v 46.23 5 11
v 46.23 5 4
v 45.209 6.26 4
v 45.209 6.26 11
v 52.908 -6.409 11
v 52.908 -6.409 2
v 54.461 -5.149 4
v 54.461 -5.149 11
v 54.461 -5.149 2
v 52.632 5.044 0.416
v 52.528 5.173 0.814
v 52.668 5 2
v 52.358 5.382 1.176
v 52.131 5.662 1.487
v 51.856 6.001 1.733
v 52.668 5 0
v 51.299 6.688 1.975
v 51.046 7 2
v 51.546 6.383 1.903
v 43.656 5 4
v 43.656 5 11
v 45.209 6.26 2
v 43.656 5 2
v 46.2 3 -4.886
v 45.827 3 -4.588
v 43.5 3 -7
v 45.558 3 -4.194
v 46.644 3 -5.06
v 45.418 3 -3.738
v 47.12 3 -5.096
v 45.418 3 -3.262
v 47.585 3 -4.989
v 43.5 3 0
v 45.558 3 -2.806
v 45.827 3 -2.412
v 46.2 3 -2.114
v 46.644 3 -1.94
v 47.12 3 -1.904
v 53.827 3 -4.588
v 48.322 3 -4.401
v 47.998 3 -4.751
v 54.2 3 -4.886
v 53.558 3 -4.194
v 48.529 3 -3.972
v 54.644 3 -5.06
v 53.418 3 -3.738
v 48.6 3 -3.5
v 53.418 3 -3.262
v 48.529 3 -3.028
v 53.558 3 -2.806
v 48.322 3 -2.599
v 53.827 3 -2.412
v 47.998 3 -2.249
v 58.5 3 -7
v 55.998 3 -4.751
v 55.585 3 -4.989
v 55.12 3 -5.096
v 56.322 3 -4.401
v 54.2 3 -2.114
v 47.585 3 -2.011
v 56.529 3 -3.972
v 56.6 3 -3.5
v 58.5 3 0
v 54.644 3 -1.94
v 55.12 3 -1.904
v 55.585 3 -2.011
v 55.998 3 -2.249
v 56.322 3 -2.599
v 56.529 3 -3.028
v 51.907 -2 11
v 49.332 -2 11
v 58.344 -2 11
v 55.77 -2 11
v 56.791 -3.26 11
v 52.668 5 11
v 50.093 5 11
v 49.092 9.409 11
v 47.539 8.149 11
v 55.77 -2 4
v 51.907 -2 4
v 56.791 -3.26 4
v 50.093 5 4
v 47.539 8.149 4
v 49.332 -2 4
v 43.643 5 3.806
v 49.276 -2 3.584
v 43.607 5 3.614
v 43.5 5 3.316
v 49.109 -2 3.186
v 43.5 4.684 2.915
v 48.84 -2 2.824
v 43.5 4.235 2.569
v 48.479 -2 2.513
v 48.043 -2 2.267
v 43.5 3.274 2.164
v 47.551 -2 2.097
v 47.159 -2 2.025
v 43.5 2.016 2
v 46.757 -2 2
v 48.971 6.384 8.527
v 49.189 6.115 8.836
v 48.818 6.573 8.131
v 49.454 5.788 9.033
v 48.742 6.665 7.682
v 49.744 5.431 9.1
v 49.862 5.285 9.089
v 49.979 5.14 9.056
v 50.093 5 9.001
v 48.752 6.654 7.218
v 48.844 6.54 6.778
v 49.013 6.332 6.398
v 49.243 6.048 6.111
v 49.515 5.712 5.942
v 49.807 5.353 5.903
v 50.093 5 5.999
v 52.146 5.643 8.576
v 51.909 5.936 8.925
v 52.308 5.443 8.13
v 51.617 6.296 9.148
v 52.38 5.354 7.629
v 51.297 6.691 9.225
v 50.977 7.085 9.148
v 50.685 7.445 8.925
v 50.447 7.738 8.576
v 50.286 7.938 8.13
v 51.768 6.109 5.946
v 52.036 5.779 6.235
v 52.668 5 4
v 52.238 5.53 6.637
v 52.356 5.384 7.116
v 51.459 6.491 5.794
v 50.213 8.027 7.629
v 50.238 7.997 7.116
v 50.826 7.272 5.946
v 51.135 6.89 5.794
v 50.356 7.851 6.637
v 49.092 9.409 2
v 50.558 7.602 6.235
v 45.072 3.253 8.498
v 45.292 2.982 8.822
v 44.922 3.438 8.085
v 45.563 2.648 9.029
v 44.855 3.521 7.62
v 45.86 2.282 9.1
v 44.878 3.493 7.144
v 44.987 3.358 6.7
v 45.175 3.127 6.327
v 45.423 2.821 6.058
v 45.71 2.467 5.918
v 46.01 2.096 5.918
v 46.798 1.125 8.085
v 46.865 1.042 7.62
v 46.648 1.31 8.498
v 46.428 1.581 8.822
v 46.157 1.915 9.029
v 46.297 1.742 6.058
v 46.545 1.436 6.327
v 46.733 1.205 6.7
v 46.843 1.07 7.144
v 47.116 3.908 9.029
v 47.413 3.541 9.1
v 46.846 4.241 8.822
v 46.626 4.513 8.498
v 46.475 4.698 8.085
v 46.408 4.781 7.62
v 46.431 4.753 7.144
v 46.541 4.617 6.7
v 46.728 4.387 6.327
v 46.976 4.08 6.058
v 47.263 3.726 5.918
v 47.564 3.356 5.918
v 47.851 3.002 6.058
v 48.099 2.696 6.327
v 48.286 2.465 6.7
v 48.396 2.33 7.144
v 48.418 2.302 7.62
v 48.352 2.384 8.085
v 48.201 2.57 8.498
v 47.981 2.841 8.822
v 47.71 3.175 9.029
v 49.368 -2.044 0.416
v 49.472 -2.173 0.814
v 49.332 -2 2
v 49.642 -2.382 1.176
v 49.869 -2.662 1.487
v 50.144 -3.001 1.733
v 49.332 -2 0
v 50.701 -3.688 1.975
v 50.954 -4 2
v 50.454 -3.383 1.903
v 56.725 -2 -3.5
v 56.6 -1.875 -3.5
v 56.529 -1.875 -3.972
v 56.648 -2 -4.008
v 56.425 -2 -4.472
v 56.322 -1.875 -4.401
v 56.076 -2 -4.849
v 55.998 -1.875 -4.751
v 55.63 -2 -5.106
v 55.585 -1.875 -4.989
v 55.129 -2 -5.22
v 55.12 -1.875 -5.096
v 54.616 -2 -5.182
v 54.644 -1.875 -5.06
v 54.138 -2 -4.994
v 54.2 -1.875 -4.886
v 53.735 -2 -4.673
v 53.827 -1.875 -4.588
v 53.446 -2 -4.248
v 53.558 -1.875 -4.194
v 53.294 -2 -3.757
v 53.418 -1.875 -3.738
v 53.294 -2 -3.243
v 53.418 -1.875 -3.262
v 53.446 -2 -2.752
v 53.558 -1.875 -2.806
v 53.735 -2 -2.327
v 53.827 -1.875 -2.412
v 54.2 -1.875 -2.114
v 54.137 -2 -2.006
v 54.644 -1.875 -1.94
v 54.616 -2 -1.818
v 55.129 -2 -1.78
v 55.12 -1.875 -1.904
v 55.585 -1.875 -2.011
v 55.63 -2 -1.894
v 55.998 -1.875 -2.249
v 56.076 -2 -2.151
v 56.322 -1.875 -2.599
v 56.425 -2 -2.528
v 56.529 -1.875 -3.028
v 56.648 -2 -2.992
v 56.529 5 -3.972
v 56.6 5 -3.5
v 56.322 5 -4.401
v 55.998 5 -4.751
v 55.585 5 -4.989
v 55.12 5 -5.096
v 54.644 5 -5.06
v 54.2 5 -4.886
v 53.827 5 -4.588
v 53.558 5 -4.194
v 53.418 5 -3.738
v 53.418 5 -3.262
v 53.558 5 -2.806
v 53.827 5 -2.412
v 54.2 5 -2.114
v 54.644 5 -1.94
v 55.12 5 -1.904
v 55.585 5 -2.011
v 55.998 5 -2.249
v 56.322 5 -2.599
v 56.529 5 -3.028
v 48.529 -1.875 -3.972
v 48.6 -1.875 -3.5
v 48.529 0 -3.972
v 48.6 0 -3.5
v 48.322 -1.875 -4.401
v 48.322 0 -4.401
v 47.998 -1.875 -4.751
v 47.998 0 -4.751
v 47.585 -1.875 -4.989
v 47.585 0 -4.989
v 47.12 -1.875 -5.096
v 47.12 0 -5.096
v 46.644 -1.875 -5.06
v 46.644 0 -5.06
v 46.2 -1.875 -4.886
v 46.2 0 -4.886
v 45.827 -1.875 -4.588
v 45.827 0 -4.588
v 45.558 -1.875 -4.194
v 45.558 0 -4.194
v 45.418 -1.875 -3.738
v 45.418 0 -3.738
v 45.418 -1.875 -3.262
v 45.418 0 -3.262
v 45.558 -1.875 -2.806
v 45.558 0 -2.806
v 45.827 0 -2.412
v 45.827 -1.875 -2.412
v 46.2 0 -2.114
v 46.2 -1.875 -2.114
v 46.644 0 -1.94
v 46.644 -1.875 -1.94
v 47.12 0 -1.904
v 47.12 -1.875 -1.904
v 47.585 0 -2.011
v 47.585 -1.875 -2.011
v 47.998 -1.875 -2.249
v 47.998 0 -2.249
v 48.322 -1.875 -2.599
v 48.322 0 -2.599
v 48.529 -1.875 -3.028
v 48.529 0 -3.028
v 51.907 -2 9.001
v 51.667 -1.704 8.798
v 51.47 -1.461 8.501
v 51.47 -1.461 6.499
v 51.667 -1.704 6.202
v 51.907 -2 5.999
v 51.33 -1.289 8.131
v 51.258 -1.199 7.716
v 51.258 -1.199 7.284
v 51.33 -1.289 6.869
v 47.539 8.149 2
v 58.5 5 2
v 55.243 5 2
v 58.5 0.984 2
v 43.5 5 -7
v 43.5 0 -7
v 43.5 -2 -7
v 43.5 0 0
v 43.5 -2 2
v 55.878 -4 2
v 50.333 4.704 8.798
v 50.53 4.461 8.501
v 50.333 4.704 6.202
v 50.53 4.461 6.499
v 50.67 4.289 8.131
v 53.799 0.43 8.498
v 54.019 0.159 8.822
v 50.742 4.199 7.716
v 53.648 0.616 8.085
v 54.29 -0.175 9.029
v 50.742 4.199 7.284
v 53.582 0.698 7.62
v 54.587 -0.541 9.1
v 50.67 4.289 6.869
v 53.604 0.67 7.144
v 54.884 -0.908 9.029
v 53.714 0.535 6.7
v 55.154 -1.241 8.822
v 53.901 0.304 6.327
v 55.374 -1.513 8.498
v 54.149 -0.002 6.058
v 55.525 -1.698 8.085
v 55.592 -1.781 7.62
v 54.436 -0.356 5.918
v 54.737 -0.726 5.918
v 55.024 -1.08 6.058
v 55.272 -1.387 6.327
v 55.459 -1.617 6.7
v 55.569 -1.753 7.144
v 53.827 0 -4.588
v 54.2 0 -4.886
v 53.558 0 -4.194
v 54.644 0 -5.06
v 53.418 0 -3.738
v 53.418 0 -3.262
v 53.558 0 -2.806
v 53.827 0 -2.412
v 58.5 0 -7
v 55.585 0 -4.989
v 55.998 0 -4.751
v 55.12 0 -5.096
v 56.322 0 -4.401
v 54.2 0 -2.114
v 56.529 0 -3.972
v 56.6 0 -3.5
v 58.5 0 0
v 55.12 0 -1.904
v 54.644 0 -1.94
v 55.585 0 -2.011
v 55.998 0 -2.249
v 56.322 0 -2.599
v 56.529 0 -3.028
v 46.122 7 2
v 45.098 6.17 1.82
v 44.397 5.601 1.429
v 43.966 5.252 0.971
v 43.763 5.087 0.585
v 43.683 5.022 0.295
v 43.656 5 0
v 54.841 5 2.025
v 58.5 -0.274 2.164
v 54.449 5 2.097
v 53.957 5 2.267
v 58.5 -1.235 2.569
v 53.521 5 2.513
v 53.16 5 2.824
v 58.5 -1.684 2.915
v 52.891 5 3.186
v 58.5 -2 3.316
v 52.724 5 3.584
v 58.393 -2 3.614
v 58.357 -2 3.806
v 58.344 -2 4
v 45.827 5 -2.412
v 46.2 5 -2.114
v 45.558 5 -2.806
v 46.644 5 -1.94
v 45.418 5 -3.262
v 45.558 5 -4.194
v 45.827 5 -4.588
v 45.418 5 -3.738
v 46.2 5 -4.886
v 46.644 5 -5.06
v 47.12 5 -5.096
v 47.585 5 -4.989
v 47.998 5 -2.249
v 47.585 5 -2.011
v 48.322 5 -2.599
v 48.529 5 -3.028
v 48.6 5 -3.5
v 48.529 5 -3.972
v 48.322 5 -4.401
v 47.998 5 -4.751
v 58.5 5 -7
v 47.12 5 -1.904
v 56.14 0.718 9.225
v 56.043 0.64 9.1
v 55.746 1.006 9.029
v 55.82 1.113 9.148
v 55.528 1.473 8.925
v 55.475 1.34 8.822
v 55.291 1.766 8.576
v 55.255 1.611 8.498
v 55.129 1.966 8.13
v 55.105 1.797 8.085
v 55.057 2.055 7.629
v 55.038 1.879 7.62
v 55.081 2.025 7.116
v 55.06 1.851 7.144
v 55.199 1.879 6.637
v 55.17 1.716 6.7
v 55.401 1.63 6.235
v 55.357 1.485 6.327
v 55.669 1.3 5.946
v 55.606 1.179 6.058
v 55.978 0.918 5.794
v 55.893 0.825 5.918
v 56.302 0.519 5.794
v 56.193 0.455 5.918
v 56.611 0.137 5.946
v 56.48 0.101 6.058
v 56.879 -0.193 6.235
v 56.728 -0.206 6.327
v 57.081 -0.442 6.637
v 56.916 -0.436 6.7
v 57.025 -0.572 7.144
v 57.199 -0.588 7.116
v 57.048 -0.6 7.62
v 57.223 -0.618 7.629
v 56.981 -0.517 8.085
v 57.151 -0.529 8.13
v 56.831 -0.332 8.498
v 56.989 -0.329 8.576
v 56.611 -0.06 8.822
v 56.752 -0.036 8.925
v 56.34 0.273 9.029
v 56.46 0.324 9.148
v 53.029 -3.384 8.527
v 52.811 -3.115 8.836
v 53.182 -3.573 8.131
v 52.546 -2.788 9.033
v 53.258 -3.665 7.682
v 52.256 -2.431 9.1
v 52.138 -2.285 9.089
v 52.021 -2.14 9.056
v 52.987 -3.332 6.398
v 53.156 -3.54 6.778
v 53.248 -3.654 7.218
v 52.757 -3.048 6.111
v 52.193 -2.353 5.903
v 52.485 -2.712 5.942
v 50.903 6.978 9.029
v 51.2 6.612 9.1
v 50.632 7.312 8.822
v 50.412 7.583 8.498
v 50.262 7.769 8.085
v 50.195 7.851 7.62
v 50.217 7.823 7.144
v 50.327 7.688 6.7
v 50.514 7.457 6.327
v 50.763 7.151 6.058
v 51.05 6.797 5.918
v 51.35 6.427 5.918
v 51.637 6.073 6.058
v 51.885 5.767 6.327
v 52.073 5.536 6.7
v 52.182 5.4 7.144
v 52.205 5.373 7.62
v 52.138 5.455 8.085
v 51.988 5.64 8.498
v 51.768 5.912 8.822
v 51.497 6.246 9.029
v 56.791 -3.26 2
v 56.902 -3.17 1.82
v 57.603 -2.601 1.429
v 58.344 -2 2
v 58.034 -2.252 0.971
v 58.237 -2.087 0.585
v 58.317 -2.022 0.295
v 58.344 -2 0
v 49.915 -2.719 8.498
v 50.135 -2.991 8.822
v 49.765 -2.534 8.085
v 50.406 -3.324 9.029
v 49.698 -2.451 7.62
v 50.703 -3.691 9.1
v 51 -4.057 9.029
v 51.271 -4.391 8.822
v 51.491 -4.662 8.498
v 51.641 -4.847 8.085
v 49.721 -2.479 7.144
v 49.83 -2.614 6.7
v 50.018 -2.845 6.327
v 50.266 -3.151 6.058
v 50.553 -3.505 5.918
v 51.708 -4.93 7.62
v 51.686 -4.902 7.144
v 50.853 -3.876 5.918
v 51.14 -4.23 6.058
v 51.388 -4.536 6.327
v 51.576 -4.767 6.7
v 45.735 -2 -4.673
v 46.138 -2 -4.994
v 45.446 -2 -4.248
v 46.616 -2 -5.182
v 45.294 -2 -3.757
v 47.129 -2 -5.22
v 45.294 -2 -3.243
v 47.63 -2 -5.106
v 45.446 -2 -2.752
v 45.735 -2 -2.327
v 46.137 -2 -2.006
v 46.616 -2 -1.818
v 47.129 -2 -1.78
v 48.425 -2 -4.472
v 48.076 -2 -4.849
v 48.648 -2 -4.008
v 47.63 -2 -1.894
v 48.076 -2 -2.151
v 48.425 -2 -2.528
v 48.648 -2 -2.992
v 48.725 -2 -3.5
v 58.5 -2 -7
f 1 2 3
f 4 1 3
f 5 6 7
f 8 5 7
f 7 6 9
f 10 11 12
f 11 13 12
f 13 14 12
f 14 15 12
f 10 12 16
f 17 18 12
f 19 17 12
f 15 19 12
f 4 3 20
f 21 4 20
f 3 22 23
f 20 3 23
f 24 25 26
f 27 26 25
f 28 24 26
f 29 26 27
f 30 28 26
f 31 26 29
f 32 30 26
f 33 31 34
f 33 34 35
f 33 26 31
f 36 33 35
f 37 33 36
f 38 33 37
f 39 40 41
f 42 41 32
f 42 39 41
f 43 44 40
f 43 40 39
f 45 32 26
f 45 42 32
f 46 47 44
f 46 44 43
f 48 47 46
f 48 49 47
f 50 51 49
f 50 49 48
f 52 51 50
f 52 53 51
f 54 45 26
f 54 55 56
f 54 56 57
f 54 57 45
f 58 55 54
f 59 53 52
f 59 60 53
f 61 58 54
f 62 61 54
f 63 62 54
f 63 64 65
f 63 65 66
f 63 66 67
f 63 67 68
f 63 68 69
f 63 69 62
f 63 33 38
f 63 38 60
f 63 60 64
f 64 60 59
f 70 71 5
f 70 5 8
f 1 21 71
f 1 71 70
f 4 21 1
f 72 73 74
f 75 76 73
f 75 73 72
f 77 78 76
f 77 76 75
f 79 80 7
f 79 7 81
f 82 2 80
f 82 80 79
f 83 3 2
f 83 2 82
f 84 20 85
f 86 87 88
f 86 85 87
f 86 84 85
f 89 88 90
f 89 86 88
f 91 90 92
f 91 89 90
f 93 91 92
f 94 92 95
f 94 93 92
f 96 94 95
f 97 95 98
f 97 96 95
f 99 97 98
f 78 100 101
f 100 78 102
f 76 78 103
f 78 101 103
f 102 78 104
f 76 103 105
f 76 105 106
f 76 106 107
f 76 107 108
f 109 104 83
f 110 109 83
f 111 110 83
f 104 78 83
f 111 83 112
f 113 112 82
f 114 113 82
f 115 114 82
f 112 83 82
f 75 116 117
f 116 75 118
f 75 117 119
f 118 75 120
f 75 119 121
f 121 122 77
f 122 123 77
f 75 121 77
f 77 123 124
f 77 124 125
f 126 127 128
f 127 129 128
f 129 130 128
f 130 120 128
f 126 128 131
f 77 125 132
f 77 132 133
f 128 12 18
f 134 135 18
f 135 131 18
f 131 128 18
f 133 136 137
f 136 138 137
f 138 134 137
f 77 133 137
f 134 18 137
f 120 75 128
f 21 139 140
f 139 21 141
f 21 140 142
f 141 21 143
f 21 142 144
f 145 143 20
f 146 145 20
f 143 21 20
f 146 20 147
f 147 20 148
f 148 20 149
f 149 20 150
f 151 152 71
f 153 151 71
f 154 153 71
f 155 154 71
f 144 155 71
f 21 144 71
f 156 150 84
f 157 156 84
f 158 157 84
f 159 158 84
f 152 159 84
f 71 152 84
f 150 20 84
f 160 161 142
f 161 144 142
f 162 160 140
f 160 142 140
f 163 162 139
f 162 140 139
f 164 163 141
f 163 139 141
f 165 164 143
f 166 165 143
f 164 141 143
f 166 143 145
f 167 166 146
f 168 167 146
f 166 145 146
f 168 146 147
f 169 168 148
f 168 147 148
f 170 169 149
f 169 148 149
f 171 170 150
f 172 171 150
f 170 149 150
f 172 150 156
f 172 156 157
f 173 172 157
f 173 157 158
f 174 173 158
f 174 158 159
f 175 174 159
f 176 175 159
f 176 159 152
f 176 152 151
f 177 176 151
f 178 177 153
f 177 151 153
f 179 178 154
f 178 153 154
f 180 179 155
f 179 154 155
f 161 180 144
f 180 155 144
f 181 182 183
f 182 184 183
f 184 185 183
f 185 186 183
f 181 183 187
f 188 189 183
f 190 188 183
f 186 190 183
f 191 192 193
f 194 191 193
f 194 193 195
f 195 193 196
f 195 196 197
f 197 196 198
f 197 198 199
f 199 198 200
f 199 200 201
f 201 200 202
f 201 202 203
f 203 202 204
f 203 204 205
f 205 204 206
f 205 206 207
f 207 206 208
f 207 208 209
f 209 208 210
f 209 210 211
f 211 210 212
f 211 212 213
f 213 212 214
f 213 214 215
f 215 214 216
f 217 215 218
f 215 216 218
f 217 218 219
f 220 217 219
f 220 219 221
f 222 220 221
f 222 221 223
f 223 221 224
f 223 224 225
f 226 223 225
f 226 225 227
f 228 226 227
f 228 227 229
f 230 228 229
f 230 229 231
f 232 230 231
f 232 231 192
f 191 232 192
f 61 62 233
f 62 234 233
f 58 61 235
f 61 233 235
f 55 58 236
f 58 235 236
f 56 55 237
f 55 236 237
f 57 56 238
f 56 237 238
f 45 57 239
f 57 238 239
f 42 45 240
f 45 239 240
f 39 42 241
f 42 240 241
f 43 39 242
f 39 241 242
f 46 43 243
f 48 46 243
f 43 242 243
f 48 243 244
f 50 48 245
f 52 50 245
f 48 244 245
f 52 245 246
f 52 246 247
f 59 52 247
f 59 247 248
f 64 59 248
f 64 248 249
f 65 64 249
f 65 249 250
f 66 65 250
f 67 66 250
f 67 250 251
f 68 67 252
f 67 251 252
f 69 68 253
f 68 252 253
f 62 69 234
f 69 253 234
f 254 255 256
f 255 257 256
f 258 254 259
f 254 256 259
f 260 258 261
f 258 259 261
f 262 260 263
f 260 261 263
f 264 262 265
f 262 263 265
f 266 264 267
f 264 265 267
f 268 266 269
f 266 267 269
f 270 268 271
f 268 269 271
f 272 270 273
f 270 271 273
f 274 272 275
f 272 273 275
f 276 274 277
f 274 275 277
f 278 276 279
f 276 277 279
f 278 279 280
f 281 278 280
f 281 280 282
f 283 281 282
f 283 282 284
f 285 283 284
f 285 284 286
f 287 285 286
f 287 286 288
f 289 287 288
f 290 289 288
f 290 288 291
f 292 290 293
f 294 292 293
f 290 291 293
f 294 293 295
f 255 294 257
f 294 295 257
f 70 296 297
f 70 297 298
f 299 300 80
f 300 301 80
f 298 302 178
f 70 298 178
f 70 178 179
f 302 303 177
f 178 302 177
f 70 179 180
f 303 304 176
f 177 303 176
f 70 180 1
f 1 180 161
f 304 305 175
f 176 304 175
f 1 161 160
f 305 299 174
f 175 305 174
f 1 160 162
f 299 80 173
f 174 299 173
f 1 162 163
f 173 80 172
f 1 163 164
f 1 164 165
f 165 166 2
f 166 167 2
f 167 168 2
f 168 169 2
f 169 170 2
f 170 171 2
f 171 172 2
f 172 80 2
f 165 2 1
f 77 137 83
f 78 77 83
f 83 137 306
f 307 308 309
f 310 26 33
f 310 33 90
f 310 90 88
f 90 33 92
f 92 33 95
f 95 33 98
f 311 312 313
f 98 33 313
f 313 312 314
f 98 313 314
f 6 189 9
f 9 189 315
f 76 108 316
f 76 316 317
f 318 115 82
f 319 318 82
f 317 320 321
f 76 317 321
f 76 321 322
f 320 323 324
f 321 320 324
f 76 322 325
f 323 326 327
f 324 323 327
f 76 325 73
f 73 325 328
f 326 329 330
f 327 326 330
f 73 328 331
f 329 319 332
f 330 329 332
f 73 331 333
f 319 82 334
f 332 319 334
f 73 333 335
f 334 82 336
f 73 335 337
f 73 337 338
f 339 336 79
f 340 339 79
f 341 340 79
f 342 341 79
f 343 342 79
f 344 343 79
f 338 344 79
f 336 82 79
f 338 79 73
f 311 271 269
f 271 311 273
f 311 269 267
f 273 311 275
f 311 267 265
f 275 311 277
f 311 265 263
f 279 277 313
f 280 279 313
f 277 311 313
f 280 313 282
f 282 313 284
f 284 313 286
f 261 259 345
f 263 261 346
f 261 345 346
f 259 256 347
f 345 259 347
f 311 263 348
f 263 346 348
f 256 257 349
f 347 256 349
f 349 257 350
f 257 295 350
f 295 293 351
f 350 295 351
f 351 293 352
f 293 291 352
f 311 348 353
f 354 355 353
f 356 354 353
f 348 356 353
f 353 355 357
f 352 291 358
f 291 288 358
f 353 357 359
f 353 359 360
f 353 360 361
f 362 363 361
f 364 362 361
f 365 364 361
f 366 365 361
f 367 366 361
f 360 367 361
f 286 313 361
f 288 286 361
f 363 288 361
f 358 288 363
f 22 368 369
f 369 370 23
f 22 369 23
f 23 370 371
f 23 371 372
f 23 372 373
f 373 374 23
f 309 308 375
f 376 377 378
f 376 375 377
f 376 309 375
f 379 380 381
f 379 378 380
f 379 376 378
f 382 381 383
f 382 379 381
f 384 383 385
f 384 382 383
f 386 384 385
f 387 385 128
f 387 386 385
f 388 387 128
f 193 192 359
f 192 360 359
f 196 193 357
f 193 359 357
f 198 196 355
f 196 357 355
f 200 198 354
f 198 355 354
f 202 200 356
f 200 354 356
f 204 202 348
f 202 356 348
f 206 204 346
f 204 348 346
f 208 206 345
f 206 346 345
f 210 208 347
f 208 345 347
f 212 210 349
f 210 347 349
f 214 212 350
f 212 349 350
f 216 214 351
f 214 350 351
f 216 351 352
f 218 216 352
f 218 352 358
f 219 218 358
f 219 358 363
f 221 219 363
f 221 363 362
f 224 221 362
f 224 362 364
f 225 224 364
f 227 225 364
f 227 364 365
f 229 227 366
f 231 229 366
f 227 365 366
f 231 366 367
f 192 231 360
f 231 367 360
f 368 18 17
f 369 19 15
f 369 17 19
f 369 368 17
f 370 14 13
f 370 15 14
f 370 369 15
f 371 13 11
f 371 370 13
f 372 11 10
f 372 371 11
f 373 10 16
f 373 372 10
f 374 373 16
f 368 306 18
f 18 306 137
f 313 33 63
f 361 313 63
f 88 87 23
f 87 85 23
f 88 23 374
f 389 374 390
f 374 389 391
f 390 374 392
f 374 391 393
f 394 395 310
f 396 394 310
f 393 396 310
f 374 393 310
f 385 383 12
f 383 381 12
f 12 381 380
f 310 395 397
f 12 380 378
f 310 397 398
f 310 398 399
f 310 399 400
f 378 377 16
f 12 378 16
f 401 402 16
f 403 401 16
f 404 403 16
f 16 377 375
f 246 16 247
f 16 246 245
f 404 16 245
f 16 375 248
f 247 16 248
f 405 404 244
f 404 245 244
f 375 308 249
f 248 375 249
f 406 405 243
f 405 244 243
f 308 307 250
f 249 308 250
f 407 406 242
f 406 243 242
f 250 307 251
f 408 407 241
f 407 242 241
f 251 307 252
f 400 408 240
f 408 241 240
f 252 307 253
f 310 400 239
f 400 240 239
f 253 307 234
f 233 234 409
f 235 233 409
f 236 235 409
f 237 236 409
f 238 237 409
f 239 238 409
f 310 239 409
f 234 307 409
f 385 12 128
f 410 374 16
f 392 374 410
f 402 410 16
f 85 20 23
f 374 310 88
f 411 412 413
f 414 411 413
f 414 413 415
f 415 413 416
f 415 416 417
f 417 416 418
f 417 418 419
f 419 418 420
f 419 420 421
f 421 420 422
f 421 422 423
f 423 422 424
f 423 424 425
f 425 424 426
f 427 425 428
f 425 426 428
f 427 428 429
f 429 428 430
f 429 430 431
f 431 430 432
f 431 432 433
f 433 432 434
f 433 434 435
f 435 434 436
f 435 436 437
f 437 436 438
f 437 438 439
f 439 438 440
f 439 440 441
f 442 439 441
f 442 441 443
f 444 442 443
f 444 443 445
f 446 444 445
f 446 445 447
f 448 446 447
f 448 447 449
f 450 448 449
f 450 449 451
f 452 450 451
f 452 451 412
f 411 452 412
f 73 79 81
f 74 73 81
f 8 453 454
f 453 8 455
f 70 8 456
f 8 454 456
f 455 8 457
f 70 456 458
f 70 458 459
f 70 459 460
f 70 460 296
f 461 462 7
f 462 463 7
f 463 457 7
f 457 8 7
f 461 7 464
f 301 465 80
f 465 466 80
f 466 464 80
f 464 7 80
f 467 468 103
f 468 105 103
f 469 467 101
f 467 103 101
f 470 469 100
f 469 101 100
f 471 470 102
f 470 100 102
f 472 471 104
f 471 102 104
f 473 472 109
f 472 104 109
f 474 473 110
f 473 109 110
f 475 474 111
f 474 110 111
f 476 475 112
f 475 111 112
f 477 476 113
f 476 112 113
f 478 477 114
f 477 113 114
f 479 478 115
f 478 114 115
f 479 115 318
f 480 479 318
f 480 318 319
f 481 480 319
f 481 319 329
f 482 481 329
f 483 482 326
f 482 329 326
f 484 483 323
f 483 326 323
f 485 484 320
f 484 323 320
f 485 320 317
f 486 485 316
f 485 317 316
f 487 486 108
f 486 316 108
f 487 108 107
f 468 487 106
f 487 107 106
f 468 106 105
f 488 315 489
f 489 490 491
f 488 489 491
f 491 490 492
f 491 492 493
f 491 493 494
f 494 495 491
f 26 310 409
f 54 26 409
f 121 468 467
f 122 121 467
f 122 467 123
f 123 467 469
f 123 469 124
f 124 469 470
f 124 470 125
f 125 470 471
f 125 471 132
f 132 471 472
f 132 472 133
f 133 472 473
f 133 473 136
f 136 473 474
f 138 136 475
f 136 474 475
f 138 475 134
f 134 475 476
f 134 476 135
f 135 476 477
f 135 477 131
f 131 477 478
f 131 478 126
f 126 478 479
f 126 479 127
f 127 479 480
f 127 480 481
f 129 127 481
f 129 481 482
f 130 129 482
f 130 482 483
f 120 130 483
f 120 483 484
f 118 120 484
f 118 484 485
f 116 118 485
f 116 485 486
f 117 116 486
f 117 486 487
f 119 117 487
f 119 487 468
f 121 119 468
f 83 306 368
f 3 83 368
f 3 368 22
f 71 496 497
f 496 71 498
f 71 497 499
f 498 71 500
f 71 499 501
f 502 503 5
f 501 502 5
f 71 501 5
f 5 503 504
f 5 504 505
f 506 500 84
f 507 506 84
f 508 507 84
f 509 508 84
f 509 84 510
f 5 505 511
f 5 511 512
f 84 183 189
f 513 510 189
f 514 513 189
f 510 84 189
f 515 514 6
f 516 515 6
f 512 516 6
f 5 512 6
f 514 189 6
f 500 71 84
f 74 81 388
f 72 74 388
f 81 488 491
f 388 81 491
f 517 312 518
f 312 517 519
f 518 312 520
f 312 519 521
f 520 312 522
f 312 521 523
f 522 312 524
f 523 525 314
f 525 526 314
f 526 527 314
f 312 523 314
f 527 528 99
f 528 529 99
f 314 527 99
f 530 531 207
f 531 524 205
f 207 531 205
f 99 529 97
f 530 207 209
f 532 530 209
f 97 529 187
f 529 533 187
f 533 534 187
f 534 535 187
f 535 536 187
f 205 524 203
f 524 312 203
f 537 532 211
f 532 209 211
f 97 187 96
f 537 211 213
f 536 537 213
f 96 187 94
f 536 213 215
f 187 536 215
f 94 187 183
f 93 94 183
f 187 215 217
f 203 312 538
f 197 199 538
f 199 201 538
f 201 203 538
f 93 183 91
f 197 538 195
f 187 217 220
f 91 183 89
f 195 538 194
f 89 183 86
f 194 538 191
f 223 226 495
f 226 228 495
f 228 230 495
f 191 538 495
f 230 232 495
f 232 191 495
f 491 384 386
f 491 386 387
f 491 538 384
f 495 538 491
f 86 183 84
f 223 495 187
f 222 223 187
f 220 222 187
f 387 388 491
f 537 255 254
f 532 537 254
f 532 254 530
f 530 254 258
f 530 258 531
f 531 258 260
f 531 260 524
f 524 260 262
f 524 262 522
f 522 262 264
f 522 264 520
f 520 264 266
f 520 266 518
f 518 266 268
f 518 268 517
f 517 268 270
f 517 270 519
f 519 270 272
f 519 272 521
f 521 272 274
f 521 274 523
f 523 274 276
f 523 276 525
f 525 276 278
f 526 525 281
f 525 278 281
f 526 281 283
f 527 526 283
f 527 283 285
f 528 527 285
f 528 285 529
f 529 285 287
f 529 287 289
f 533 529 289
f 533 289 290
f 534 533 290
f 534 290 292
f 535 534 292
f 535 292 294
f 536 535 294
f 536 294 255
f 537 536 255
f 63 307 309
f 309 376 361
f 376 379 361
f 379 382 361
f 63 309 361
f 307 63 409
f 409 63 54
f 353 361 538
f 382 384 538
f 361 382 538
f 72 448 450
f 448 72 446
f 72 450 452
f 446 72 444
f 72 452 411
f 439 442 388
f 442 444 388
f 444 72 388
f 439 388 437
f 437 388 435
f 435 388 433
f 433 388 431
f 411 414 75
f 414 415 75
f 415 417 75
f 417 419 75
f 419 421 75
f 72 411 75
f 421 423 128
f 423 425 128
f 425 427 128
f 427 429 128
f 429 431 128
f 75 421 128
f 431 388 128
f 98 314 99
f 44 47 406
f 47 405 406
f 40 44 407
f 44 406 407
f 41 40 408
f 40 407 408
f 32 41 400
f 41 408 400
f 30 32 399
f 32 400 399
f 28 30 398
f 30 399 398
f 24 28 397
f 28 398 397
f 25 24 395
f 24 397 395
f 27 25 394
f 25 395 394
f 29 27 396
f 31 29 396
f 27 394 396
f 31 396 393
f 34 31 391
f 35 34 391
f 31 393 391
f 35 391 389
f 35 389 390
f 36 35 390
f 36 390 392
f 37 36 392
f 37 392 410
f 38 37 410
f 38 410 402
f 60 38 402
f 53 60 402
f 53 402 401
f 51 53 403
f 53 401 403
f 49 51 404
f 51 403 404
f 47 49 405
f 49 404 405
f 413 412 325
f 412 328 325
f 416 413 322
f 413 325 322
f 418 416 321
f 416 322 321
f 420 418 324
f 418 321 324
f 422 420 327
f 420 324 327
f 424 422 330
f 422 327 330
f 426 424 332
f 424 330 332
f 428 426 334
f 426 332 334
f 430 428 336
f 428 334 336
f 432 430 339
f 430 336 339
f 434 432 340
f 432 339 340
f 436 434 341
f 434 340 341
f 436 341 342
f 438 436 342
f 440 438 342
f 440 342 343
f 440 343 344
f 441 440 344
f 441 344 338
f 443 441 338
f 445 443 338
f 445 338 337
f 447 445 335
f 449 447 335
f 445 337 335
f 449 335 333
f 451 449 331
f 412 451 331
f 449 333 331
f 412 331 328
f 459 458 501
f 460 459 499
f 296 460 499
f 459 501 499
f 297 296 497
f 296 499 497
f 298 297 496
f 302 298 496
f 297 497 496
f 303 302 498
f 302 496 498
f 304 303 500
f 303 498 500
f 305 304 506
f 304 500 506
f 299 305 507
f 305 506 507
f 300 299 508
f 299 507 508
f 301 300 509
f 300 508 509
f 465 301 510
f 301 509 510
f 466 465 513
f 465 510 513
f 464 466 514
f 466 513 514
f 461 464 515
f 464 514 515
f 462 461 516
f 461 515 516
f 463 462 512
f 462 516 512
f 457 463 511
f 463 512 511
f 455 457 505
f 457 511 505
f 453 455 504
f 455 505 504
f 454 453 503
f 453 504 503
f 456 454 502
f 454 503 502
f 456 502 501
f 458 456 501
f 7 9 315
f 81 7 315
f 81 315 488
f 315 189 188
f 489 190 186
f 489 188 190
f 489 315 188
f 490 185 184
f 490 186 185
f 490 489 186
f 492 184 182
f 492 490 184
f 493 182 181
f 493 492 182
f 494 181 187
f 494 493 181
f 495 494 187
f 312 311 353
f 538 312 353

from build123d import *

# Parameters (mm, degrees)
SKETCH1_W                      = 15
SKETCH1_H                      = 2
BOSS_EXTRUDE1_DEPTH            = 7
BOSS_EXTRUDE1_2_DEPTH          = 7
SKETCH2_W                      = 15
SKETCH2_H                      = 7
BOSS_EXTRUDE2_DEPTH            = 2
BOSS_EXTRUDE3_DEPTH            = 9
BOSS_EXTRUDE4_DEPTH            = 2
M3_CLEARANCE_HOLE1_D           = 3.2
M3_CLEARANCE_HOLE1_CSINK_D     = 3.45
M3_CLEARANCE_HOLE1_CSINK_ANGLE = 90
M3_CLEARANCE_HOLE2_D           = 3.2
M3_CLEARANCE_HOLE2_CSINK_D     = 3.45
M3_CLEARANCE_HOLE2_CSINK_ANGLE = 90
FILLET2_R                      = 2
FILLET3_R                      = 2


with BuildPart() as part:
    # Sketch1 → Boss-Extrude1 (new body)
    with BuildSketch(Plane.XY):
        with Locations((51, 4)):
            Rectangle(SKETCH1_W, SKETCH1_H)
    extrude(amount=-BOSS_EXTRUDE1_DEPTH)



with BuildPart() as body_2:
    # Sketch1 → Boss-Extrude1 2 (new body)
    with BuildSketch(Plane.XY):
        with Locations((51, -1)):
            Rectangle(SKETCH1_W, SKETCH1_H)
    extrude(amount=-BOSS_EXTRUDE1_2_DEPTH)


with BuildPart() as part_1:
    add(part.part)

    add(body_2.part)  # Boss-Extrude2 merges body 2
    # Sketch2 → Boss-Extrude2 (add)
    with BuildSketch(Plane.XY):
        with Locations((51, 1.5)):
            Rectangle(SKETCH2_W, SKETCH2_H)
    extrude(amount=BOSS_EXTRUDE2_DEPTH)

    # Sketch3 → Boss-Extrude3 (add)
    with BuildSketch(Plane.XY.offset(2)):
        Polygon((49.332085067, -2), (51.907060552, -2), (46.23047622, 5), (43.655500735, 5), align=None)
        Polygon((52.9075543, -6.409039515), (54.460967148, -5.149313939), (51.907060552, -2), (49.332085067, -2), align=None)
        Polygon((50.092939448, 5), (55.76952378, -2), (58.344499265, -2), (52.667914933, 5), align=None)
        Polygon((47.539032852, 8.149313939), (50.092939448, 5), (52.667914933, 5), (49.0924457, 9.409039515), align=None)
        Polygon((43.655500735, 5), (46.23047622, 5), (45.208913582, 6.259725576), align=None)
        Polygon((58.344499265, -2), (55.76952378, -2), (56.791086418, -3.259725576), align=None)
    extrude(amount=BOSS_EXTRUDE3_DEPTH)

    # Sketch4 → Boss-Extrude4 (add)
    with BuildSketch(Plane.XY.offset(2)):
        Polygon((43.655500735, 5), (52.9075543, -6.409039515), (58.344499265, -2), (49.0924457, 9.409039515), align=None)
    extrude(amount=BOSS_EXTRUDE4_DEPTH)

    # M3 Clearance Hole1 (through all)
    with Locations(Plane(origin=(34.219216483, 27.749752594, 0), x_dir=(0, 0, -1), z_dir=(0.7767064235919557, 0.6298627878760529, 0))):
        with Locations((-7.5, -34.802441812), (-7.5, -27.113443281)):
            CounterSinkHole(M3_CLEARANCE_HOLE1_D / 2, M3_CLEARANCE_HOLE1_CSINK_D / 2, counter_sink_angle=M3_CLEARANCE_HOLE1_CSINK_ANGLE)

    # M3 Clearance Hole2 (through all)
    with Locations(Plane(origin=(0, -2, 0), x_dir=(-1, 0, 0), z_dir=(0, -1, 0))):
        with Locations((-47, 3.5), (-55, 3.5)):
            CounterSinkHole(M3_CLEARANCE_HOLE2_D / 2, M3_CLEARANCE_HOLE2_CSINK_D / 2, counter_sink_angle=M3_CLEARANCE_HOLE2_CSINK_ANGLE)

    # Fillet2
    # the kernel refuses this fillet: 2 mm, written as the material it adds along each edge
    with BuildSketch(Plane(origin=(63.344499265, -2, 2), x_dir=(0, -1, 0), z_dir=(-1, 0, 0))) as fillet2_piece_1_section:
        with BuildLine():
            CenterArc((FILLET2_R, -FILLET2_R), FILLET2_R, 90, 90)
            Line((0, -FILLET2_R), (0, 0))
            Line((0, 0), (FILLET2_R, 0))
        make_face()
    fillet2_piece_1 = extrude(amount=19.012414198, mode=Mode.PRIVATE)
    fillet2_piece_1 = split(fillet2_piece_1, bisect_by=Plane(origin=(51.286566394, -4.410141115, 1.532384034), z_dir=(0.776706423591956, 0.6298627878760524, 0)), keep=Keep.TOP, mode=Mode.PRIVATE)
    fillet2_piece_1 = split(fillet2_piece_1, bisect_by=Plane(origin=(55.372467702, -4.410141115, 1.532384034), z_dir=(-0.6298627878760494, 0.7767064235919585, 0)), keep=Keep.TOP, mode=Mode.PRIVATE)
    add(fillet2_piece_1)
    with BuildSketch(Plane(origin=(38.655500735, 5, 2), x_dir=(0, 0, -1), z_dir=(1, 0, 0))) as fillet2_piece_2_section:
        with BuildLine():
            CenterArc((FILLET2_R, FILLET2_R), FILLET2_R, 180, 90)
            Line((0, FILLET2_R), (0, 0))
            Line((0, 0), (FILLET2_R, 0))
        make_face()
    fillet2_piece_2 = extrude(amount=19.012414198, mode=Mode.PRIVATE)
    fillet2_piece_2 = split(fillet2_piece_2, bisect_by=Plane(origin=(46.627532298, 7.410141115, 1.532384034), z_dir=(0.6298627878760538, -0.776706423591955, 0)), keep=Keep.TOP, mode=Mode.PRIVATE)
    fillet2_piece_2 = split(fillet2_piece_2, bisect_by=Plane(origin=(50.713433606, 7.410141115, 1.532384034), z_dir=(-0.776706423591956, -0.6298627878760528, 0)), keep=Keep.TOP, mode=Mode.PRIVATE)
    add(fillet2_piece_2)

    # Fillet3
    # the kernel refuses this fillet: 2 mm, written as the material it adds along each edge
    with BuildSketch(Plane(origin=(52.481399006, -5.883532118, 2), x_dir=(-0.7767064235919561, -0.6298627878760525, 0), z_dir=(-0.6298627878760524, 0.7767064235919561, 0))) as fillet3_piece_1_section:
        with BuildLine():
            CenterArc((FILLET3_R, FILLET3_R), FILLET3_R, 180, 90)
            Line((0, FILLET3_R), (0, 0))
            Line((0, 0), (FILLET3_R, 0))
        make_face()
    fillet3_piece_1 = extrude(amount=19.012414198, mode=Mode.PRIVATE)
    fillet3_piece_1 = split(fillet3_piece_1, bisect_by=Plane(origin=(46.164389013, 5, 2.465360244), z_dir=(0, -1, 0)), keep=Keep.TOP, mode=Mode.PRIVATE)
    fillet3_piece_1 = split(fillet3_piece_1, bisect_by=Plane(origin=(43.5, 1.248668865, 2.465360244), z_dir=(1, 0, 0)), keep=Keep.TOP, mode=Mode.PRIVATE)
    fillet3_piece_1 = split(fillet3_piece_1, bisect_by=Plane(origin=(46.164389013, -2, 2.465360244), z_dir=(0, 1, 0)), keep=Keep.TOP, mode=Mode.PRIVATE)
    add(fillet3_piece_1)
    with BuildSketch(Plane(origin=(61.493813205, -5.883532118, 2), x_dir=(0, 0, 1), z_dir=(-0.6298627878760524, 0.776706423591956, 0))) as fillet3_piece_2_section:
        with BuildLine():
            CenterArc((FILLET3_R, FILLET3_R), FILLET3_R, 180, 90)
            Line((0, FILLET3_R), (0, 0))
            Line((0, 0), (FILLET3_R, 0))
        make_face()
    fillet3_piece_2 = extrude(amount=19.012414198, mode=Mode.PRIVATE)
    fillet3_piece_2 = split(fillet3_piece_2, bisect_by=Plane(origin=(58.444828917, 5, 2.691548942), z_dir=(0, -1, 0)), keep=Keep.TOP, mode=Mode.PRIVATE)
    fillet3_piece_2 = split(fillet3_piece_2, bisect_by=Plane(origin=(58.5, -1.960151195, 2.691548942), z_dir=(-1, 0, 0)), keep=Keep.TOP, mode=Mode.PRIVATE)
    fillet3_piece_2 = split(fillet3_piece_2, bisect_by=Plane(origin=(58.444828917, -2, 2.691548942), z_dir=(0, 1, 0)), keep=Keep.TOP, mode=Mode.PRIVATE)
    add(fillet3_piece_2)


solid = part_1.part
